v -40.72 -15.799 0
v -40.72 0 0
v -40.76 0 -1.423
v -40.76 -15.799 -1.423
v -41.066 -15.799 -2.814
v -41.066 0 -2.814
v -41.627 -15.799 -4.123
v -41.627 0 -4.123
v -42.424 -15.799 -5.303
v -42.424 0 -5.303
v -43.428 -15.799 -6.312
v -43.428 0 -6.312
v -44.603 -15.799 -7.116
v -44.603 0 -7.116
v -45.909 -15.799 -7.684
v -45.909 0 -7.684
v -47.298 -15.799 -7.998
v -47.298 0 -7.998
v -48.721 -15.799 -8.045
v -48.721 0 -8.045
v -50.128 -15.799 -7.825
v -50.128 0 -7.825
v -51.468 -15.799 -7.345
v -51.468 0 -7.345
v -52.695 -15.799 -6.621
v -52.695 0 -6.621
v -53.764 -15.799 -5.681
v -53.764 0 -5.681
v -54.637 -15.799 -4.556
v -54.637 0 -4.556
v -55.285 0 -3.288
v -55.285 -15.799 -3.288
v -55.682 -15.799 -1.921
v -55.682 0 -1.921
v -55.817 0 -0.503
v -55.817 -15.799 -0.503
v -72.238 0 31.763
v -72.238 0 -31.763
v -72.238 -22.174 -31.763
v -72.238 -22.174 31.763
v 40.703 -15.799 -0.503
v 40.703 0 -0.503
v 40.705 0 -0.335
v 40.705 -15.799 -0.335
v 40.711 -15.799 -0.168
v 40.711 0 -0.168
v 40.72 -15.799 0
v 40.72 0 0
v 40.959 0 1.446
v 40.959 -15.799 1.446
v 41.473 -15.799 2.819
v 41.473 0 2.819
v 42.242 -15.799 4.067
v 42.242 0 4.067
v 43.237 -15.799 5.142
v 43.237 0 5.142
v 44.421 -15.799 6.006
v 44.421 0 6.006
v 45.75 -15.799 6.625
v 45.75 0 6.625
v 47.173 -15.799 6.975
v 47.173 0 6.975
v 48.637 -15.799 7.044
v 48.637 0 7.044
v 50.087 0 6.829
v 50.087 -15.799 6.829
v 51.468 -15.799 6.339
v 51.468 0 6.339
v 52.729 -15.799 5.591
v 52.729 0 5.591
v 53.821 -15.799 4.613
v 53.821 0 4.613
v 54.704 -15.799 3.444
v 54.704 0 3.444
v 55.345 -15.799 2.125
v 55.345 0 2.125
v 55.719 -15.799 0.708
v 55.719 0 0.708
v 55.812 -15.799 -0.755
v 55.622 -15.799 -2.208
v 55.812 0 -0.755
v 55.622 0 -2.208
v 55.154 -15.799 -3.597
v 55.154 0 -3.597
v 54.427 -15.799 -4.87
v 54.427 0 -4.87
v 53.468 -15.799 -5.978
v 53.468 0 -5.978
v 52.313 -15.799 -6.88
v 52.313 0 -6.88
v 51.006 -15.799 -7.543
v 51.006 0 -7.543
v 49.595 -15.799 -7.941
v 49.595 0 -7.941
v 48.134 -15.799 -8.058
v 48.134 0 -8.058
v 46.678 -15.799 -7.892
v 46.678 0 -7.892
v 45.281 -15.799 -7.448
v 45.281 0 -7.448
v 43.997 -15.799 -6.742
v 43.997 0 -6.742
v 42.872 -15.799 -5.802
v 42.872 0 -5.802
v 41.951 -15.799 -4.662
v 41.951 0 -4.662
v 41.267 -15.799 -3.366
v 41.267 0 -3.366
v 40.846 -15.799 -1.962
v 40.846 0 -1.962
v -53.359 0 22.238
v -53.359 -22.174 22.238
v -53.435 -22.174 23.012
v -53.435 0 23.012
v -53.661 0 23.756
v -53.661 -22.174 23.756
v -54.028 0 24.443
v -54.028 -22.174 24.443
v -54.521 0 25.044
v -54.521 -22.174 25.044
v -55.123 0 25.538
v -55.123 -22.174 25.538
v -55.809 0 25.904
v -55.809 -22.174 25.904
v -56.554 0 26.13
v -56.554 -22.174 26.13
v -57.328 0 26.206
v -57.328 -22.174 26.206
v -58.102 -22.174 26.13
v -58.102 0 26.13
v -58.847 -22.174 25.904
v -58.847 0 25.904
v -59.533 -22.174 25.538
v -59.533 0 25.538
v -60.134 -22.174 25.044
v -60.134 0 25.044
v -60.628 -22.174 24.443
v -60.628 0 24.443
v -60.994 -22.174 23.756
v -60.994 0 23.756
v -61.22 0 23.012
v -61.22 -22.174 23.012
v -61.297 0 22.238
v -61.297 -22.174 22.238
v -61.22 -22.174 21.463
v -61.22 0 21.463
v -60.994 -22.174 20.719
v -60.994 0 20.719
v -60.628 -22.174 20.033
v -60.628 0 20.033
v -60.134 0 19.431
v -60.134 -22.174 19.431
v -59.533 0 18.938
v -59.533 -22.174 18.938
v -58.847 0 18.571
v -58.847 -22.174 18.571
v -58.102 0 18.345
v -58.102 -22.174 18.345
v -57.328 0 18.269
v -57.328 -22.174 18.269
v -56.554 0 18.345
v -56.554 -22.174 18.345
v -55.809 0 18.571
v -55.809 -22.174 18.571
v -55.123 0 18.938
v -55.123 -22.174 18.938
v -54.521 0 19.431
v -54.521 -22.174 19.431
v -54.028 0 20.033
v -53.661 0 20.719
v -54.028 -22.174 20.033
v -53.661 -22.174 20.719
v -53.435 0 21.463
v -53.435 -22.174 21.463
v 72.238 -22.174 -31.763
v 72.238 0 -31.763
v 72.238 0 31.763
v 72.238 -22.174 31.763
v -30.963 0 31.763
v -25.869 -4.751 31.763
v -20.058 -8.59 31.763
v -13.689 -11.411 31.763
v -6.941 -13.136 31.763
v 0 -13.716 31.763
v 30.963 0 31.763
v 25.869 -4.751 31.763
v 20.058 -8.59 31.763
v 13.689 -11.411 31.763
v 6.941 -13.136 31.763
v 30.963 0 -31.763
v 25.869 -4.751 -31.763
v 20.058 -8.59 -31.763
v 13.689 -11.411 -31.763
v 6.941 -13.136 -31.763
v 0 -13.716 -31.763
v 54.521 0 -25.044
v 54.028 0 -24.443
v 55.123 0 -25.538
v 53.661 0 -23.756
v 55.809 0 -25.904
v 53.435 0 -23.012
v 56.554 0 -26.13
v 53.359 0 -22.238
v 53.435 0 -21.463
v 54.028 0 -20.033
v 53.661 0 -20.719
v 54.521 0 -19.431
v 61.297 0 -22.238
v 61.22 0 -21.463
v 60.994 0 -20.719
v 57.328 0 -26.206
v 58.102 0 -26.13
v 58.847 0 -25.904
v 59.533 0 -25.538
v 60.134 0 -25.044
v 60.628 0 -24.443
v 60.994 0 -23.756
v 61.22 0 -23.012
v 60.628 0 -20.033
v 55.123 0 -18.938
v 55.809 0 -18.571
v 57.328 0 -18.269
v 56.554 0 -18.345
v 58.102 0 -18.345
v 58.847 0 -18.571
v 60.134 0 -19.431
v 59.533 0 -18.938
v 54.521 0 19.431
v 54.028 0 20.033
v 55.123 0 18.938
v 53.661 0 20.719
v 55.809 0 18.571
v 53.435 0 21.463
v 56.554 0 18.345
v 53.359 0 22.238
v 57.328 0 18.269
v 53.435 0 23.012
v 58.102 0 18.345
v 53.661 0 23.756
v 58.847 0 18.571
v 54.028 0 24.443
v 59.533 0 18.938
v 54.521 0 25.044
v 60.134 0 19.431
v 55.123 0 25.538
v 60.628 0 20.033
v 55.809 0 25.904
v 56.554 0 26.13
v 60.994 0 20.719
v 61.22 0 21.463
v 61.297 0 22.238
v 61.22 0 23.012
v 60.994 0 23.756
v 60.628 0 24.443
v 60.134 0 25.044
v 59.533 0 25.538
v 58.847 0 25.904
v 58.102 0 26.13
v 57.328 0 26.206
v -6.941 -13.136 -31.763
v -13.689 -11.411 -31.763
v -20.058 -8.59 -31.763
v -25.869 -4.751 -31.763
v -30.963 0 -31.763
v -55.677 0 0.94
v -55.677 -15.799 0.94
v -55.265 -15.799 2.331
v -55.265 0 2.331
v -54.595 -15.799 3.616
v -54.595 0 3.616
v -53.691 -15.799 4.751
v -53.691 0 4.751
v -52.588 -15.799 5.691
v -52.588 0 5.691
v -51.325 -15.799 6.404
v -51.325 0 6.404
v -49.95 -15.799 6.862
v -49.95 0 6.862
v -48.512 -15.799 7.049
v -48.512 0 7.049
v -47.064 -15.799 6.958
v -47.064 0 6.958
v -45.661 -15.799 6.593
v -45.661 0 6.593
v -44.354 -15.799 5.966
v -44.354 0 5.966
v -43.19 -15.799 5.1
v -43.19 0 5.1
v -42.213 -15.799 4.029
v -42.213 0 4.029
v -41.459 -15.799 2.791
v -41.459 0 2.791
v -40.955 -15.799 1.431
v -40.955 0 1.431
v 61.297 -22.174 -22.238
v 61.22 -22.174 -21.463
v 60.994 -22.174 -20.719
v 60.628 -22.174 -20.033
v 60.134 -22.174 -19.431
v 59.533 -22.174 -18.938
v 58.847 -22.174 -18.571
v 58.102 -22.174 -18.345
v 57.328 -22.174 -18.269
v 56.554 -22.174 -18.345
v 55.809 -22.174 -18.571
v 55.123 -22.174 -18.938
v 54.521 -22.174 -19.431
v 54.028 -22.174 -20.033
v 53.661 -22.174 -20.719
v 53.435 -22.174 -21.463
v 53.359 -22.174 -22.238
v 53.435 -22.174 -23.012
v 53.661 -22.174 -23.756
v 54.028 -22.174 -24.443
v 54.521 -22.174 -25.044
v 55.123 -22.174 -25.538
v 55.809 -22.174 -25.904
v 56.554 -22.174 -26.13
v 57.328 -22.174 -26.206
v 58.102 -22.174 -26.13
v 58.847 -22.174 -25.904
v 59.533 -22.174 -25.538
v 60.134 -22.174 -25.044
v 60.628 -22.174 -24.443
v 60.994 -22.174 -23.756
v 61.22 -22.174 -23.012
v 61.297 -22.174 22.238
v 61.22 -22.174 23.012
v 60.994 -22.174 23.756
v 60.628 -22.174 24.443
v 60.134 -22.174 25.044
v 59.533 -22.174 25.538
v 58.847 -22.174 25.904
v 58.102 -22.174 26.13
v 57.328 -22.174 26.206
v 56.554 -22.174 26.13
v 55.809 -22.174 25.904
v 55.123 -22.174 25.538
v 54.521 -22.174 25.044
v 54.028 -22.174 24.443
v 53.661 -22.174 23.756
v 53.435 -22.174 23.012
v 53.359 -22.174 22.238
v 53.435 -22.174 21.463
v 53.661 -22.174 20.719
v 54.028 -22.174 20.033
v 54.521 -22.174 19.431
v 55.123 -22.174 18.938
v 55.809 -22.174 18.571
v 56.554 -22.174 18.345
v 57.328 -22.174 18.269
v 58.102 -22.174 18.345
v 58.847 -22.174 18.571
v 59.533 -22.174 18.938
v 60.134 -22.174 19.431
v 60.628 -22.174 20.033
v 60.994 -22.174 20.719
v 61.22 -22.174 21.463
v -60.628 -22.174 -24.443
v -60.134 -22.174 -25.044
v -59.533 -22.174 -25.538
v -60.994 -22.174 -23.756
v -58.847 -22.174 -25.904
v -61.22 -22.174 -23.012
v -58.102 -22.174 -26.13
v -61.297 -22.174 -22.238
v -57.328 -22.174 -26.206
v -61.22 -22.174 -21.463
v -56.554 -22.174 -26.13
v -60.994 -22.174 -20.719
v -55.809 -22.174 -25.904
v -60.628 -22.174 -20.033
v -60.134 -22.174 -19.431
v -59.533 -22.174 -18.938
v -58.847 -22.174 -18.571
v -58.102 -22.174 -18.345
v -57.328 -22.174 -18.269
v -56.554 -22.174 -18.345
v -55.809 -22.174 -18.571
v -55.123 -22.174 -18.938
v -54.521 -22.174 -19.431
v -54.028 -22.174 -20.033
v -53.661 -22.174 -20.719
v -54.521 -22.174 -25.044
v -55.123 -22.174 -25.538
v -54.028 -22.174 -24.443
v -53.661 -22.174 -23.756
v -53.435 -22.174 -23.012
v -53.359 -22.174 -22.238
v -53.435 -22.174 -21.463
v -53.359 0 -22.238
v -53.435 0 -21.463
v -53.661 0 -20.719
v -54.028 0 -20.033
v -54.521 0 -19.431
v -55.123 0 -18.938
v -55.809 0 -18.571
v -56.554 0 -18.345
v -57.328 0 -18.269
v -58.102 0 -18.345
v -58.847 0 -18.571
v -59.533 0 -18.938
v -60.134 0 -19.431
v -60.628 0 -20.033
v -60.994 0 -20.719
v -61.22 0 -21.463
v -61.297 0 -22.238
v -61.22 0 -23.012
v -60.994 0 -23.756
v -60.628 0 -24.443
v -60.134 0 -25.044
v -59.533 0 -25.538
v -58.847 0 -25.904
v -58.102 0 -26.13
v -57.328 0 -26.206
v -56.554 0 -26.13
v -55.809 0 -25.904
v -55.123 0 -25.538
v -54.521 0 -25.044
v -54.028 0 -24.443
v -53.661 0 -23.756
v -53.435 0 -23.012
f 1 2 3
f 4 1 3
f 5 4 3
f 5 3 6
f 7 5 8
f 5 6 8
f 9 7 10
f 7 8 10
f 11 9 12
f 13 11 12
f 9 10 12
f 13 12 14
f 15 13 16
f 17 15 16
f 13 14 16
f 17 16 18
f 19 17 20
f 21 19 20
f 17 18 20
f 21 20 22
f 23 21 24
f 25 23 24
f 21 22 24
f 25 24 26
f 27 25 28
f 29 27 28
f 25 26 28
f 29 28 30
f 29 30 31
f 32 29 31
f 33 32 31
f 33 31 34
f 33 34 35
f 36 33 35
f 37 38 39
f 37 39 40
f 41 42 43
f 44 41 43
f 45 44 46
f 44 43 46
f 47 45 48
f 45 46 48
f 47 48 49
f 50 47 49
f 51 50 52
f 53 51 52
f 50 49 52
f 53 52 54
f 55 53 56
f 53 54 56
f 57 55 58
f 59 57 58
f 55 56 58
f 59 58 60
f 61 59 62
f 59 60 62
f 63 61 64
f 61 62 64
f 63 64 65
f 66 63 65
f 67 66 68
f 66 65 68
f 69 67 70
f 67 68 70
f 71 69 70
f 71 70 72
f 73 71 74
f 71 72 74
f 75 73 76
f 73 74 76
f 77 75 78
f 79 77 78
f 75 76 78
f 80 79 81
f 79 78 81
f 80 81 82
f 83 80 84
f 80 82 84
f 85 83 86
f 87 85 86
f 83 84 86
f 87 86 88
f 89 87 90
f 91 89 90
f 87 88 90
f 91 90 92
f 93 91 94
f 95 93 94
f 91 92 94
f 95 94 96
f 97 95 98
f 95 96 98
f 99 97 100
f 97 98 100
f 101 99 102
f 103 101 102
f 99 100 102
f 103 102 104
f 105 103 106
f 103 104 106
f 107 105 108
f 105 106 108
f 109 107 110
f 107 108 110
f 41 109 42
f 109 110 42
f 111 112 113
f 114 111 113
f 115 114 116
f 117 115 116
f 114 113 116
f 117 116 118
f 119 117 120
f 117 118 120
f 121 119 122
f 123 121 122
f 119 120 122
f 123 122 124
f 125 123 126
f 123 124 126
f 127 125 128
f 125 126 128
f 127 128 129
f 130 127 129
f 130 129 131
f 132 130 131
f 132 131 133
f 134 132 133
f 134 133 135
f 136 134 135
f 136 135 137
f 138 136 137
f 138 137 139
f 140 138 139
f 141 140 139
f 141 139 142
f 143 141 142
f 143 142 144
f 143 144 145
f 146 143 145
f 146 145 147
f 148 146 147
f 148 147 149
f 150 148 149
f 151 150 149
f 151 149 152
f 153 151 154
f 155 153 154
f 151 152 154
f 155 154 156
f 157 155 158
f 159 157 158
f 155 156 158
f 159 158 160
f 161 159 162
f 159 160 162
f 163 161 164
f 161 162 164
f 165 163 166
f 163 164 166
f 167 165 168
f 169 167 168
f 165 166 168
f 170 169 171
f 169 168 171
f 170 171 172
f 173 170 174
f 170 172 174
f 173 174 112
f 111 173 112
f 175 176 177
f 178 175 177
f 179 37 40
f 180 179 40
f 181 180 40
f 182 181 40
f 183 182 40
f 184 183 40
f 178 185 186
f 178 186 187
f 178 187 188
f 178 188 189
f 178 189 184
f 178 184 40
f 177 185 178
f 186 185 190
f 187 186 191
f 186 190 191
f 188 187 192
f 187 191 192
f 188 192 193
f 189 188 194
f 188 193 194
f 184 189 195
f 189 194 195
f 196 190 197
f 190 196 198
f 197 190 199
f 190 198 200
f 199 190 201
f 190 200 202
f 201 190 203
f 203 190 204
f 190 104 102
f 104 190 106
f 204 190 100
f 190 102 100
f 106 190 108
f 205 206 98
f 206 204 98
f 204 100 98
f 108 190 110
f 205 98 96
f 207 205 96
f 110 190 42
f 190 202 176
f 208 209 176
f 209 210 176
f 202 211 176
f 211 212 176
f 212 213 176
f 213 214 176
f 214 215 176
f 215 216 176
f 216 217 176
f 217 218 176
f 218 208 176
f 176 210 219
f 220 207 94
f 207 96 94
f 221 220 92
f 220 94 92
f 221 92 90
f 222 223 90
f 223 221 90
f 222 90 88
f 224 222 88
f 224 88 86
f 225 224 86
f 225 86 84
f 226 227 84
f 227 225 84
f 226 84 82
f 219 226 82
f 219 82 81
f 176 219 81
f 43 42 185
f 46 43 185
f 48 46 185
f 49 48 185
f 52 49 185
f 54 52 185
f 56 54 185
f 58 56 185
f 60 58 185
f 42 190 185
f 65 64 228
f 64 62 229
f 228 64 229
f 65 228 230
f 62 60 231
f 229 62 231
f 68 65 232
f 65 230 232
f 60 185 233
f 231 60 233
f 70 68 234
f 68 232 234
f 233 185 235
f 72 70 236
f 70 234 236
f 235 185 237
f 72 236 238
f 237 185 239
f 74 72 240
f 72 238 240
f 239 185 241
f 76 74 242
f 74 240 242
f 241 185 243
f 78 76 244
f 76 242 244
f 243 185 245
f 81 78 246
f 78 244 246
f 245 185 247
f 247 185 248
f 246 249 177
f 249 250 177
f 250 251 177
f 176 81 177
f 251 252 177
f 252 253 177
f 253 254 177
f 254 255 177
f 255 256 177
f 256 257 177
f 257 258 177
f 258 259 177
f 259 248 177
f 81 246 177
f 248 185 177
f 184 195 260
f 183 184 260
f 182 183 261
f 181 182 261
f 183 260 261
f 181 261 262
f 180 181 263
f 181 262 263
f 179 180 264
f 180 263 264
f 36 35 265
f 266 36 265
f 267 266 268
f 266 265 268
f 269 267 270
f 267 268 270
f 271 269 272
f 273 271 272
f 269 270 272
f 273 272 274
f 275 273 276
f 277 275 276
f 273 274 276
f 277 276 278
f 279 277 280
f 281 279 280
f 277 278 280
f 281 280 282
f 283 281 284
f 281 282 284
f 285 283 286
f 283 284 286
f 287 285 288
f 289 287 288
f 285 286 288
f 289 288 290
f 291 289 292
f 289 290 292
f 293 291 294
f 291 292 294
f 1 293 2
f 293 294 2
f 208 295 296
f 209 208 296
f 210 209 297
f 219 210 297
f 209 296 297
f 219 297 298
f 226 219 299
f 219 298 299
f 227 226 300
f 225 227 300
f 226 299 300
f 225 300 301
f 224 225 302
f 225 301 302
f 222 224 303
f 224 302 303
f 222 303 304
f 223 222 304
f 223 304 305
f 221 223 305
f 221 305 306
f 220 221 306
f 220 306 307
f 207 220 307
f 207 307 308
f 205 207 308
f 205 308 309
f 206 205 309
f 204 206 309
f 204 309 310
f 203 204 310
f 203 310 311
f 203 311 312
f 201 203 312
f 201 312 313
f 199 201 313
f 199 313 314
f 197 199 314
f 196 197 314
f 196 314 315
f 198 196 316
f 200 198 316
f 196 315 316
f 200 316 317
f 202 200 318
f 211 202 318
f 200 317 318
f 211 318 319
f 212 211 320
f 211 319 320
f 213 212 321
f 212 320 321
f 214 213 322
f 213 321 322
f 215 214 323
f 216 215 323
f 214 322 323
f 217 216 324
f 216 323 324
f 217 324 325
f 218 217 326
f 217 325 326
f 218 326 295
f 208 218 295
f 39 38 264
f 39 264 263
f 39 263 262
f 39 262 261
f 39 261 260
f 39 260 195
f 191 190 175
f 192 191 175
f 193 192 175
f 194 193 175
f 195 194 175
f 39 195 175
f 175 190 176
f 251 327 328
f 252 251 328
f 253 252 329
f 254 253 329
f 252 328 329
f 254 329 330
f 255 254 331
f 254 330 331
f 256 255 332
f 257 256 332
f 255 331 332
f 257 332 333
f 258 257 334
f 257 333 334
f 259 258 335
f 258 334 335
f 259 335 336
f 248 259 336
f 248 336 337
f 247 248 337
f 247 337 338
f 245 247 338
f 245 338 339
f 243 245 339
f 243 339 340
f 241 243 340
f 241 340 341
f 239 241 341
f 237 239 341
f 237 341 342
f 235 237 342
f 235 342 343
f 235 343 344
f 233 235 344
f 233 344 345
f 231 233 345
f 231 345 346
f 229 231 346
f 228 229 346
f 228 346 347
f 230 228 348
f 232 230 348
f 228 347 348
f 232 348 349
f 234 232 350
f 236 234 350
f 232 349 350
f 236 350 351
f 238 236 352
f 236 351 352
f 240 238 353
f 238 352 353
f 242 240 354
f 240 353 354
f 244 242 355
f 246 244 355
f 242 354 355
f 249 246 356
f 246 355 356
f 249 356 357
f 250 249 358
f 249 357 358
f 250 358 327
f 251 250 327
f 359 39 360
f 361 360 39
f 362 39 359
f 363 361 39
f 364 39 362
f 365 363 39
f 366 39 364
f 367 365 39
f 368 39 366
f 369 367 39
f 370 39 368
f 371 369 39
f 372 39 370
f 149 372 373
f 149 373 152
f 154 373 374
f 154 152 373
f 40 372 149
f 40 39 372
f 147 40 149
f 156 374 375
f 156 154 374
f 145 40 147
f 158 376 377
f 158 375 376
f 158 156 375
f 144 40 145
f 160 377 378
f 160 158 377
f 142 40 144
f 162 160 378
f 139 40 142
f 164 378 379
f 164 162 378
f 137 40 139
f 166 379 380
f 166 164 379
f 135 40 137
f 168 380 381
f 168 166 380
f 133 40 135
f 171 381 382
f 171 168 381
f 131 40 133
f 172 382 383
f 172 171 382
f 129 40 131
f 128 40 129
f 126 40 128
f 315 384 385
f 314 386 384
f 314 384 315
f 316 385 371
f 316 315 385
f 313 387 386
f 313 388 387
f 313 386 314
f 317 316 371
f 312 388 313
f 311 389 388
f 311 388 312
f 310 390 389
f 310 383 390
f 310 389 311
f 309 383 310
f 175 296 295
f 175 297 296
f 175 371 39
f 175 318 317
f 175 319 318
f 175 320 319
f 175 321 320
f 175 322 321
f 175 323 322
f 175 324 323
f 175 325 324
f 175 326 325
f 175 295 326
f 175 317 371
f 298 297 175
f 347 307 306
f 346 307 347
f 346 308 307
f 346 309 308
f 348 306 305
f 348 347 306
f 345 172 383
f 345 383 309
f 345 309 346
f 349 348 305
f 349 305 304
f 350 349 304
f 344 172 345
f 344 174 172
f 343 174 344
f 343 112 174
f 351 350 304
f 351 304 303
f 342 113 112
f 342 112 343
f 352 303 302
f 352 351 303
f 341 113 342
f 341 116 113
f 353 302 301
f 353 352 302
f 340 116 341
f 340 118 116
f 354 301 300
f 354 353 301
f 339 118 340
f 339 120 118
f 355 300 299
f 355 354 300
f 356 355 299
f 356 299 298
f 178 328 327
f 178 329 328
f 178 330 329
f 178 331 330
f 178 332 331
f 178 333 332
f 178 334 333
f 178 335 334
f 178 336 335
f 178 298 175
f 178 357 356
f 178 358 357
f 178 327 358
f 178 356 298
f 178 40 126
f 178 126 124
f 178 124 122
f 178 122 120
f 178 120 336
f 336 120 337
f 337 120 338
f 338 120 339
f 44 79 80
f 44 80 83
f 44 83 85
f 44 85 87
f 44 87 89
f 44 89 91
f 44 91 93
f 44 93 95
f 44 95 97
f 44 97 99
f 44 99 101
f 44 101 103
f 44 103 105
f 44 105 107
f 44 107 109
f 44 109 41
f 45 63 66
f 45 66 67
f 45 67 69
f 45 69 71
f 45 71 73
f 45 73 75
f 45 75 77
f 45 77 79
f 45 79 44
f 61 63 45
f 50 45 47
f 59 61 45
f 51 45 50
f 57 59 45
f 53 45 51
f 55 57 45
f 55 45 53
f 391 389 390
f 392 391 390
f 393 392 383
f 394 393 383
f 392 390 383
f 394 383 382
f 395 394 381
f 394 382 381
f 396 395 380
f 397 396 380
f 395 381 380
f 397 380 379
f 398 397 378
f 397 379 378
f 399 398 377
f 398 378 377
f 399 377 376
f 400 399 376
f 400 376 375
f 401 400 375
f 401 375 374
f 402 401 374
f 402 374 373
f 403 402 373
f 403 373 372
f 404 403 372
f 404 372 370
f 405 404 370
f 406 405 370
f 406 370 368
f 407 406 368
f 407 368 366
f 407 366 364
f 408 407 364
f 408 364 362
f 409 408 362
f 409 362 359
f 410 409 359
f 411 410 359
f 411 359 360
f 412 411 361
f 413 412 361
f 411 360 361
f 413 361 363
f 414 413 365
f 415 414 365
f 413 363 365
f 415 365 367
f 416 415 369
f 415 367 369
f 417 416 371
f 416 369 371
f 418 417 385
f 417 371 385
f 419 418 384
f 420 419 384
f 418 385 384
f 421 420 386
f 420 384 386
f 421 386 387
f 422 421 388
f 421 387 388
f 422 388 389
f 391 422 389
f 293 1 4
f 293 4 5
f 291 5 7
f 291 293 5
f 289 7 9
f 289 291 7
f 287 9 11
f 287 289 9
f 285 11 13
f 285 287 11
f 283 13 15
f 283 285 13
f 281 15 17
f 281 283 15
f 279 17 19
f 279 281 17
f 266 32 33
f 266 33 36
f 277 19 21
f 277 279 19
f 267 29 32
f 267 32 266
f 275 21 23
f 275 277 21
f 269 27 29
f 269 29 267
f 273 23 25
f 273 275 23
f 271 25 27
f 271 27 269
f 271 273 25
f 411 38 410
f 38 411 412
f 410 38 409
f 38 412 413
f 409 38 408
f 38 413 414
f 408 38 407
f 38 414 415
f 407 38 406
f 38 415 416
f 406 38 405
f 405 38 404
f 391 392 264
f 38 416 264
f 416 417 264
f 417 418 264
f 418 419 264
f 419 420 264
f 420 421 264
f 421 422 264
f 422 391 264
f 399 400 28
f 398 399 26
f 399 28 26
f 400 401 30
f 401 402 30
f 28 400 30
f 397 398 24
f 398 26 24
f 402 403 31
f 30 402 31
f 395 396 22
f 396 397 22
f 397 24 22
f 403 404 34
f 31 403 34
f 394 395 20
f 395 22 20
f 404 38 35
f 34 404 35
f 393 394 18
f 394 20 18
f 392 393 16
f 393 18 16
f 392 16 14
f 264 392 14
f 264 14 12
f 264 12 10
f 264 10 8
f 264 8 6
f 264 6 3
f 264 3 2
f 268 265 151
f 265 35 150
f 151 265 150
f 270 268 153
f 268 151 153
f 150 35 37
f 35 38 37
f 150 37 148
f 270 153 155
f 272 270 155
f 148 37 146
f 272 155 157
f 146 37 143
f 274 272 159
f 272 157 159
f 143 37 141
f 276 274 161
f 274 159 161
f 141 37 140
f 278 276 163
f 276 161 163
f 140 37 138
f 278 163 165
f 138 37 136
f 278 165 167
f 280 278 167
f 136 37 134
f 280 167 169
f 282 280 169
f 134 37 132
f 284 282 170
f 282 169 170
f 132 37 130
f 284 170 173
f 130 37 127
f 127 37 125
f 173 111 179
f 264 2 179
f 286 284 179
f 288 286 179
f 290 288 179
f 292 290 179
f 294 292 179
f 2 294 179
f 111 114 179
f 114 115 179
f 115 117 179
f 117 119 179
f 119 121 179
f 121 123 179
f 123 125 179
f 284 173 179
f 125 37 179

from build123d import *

# Parameters (mm, degrees)
F0_W     = 144.4752
F0_H     = 63.5254
F1_DEPTH = 22.1742
F2_R     = 3.96875
F3_DEPTH = 22.1752
F5_DEPTH = 63.5264
F7_DEPTH = 15.7988
F9_DEPTH = 15.7988


with BuildPart() as f1:
    # F0 (on Front) → F1 (new body)
    with BuildSketch(Plane.XZ):
        Rectangle(F0_W, F0_H)
    extrude(amount=F1_DEPTH)

    # F2 (on face) → F3 (cut, through all)
    with BuildSketch(Plane.XZ.offset(22.1742)):
        with Locations((-57.3278, 22.2377)):
            Circle(F2_R)
        with Locations((-57.3278, -22.2377)):
            Circle(F2_R)
        with Locations((57.3278, -22.2377)):
            Circle(F2_R)
        with Locations((57.3278, 22.2377)):
            Circle(F2_R)
    extrude(amount=-F3_DEPTH, mode=Mode.SUBTRACT)

    # F4 (on face) → F5 (cut, through all)
    with BuildSketch(Plane(origin=(0, 0, -31.7627), x_dir=(1, 0, 0), z_dir=(0, 0, -1))):
        with BuildLine():
            ThreePointArc((30.9626, 0), (16.932301, 10.1335), (0, 13.716))
            ThreePointArc((0, 13.716), (-16.932301, 10.1335), (-30.9626, 0))
            Line((-30.9626, 0), (30.9626, 0))
        make_face()
    extrude(amount=-F5_DEPTH, mode=Mode.SUBTRACT)

    # F6 (on face) → F7 (cut)
    with BuildSketch(Plane(origin=(0, 0, 0), x_dir=(-1, 0, 0), z_dir=(0, 1, 0))):
        with BuildLine():
            ThreePointArc((-40.720254, 0), (-55.81231, -0.75452), (-40.7035, -0.50292))
            ThreePointArc((-40.7035, -0.50292), (-40.70769, -0.25132), (-40.720254, 0))
        make_face()
    extrude(amount=-F7_DEPTH, mode=Mode.SUBTRACT)

    # F8 (on face) → F9 (cut)
    with BuildSketch(Plane(origin=(0, 0, 0), x_dir=(-1, 0, 0), z_dir=(0, 1, 0))):
        with BuildLine():
            ThreePointArc((40.720254, 0), (48.0084, -8.05523), (55.8165, -0.50292))
            ThreePointArc((55.8165, -0.50292), (48.5116, 7.04939), (40.720254, 0))
        make_face()
    extrude(amount=-F9_DEPTH, mode=Mode.SUBTRACT)


solid = f1.part
